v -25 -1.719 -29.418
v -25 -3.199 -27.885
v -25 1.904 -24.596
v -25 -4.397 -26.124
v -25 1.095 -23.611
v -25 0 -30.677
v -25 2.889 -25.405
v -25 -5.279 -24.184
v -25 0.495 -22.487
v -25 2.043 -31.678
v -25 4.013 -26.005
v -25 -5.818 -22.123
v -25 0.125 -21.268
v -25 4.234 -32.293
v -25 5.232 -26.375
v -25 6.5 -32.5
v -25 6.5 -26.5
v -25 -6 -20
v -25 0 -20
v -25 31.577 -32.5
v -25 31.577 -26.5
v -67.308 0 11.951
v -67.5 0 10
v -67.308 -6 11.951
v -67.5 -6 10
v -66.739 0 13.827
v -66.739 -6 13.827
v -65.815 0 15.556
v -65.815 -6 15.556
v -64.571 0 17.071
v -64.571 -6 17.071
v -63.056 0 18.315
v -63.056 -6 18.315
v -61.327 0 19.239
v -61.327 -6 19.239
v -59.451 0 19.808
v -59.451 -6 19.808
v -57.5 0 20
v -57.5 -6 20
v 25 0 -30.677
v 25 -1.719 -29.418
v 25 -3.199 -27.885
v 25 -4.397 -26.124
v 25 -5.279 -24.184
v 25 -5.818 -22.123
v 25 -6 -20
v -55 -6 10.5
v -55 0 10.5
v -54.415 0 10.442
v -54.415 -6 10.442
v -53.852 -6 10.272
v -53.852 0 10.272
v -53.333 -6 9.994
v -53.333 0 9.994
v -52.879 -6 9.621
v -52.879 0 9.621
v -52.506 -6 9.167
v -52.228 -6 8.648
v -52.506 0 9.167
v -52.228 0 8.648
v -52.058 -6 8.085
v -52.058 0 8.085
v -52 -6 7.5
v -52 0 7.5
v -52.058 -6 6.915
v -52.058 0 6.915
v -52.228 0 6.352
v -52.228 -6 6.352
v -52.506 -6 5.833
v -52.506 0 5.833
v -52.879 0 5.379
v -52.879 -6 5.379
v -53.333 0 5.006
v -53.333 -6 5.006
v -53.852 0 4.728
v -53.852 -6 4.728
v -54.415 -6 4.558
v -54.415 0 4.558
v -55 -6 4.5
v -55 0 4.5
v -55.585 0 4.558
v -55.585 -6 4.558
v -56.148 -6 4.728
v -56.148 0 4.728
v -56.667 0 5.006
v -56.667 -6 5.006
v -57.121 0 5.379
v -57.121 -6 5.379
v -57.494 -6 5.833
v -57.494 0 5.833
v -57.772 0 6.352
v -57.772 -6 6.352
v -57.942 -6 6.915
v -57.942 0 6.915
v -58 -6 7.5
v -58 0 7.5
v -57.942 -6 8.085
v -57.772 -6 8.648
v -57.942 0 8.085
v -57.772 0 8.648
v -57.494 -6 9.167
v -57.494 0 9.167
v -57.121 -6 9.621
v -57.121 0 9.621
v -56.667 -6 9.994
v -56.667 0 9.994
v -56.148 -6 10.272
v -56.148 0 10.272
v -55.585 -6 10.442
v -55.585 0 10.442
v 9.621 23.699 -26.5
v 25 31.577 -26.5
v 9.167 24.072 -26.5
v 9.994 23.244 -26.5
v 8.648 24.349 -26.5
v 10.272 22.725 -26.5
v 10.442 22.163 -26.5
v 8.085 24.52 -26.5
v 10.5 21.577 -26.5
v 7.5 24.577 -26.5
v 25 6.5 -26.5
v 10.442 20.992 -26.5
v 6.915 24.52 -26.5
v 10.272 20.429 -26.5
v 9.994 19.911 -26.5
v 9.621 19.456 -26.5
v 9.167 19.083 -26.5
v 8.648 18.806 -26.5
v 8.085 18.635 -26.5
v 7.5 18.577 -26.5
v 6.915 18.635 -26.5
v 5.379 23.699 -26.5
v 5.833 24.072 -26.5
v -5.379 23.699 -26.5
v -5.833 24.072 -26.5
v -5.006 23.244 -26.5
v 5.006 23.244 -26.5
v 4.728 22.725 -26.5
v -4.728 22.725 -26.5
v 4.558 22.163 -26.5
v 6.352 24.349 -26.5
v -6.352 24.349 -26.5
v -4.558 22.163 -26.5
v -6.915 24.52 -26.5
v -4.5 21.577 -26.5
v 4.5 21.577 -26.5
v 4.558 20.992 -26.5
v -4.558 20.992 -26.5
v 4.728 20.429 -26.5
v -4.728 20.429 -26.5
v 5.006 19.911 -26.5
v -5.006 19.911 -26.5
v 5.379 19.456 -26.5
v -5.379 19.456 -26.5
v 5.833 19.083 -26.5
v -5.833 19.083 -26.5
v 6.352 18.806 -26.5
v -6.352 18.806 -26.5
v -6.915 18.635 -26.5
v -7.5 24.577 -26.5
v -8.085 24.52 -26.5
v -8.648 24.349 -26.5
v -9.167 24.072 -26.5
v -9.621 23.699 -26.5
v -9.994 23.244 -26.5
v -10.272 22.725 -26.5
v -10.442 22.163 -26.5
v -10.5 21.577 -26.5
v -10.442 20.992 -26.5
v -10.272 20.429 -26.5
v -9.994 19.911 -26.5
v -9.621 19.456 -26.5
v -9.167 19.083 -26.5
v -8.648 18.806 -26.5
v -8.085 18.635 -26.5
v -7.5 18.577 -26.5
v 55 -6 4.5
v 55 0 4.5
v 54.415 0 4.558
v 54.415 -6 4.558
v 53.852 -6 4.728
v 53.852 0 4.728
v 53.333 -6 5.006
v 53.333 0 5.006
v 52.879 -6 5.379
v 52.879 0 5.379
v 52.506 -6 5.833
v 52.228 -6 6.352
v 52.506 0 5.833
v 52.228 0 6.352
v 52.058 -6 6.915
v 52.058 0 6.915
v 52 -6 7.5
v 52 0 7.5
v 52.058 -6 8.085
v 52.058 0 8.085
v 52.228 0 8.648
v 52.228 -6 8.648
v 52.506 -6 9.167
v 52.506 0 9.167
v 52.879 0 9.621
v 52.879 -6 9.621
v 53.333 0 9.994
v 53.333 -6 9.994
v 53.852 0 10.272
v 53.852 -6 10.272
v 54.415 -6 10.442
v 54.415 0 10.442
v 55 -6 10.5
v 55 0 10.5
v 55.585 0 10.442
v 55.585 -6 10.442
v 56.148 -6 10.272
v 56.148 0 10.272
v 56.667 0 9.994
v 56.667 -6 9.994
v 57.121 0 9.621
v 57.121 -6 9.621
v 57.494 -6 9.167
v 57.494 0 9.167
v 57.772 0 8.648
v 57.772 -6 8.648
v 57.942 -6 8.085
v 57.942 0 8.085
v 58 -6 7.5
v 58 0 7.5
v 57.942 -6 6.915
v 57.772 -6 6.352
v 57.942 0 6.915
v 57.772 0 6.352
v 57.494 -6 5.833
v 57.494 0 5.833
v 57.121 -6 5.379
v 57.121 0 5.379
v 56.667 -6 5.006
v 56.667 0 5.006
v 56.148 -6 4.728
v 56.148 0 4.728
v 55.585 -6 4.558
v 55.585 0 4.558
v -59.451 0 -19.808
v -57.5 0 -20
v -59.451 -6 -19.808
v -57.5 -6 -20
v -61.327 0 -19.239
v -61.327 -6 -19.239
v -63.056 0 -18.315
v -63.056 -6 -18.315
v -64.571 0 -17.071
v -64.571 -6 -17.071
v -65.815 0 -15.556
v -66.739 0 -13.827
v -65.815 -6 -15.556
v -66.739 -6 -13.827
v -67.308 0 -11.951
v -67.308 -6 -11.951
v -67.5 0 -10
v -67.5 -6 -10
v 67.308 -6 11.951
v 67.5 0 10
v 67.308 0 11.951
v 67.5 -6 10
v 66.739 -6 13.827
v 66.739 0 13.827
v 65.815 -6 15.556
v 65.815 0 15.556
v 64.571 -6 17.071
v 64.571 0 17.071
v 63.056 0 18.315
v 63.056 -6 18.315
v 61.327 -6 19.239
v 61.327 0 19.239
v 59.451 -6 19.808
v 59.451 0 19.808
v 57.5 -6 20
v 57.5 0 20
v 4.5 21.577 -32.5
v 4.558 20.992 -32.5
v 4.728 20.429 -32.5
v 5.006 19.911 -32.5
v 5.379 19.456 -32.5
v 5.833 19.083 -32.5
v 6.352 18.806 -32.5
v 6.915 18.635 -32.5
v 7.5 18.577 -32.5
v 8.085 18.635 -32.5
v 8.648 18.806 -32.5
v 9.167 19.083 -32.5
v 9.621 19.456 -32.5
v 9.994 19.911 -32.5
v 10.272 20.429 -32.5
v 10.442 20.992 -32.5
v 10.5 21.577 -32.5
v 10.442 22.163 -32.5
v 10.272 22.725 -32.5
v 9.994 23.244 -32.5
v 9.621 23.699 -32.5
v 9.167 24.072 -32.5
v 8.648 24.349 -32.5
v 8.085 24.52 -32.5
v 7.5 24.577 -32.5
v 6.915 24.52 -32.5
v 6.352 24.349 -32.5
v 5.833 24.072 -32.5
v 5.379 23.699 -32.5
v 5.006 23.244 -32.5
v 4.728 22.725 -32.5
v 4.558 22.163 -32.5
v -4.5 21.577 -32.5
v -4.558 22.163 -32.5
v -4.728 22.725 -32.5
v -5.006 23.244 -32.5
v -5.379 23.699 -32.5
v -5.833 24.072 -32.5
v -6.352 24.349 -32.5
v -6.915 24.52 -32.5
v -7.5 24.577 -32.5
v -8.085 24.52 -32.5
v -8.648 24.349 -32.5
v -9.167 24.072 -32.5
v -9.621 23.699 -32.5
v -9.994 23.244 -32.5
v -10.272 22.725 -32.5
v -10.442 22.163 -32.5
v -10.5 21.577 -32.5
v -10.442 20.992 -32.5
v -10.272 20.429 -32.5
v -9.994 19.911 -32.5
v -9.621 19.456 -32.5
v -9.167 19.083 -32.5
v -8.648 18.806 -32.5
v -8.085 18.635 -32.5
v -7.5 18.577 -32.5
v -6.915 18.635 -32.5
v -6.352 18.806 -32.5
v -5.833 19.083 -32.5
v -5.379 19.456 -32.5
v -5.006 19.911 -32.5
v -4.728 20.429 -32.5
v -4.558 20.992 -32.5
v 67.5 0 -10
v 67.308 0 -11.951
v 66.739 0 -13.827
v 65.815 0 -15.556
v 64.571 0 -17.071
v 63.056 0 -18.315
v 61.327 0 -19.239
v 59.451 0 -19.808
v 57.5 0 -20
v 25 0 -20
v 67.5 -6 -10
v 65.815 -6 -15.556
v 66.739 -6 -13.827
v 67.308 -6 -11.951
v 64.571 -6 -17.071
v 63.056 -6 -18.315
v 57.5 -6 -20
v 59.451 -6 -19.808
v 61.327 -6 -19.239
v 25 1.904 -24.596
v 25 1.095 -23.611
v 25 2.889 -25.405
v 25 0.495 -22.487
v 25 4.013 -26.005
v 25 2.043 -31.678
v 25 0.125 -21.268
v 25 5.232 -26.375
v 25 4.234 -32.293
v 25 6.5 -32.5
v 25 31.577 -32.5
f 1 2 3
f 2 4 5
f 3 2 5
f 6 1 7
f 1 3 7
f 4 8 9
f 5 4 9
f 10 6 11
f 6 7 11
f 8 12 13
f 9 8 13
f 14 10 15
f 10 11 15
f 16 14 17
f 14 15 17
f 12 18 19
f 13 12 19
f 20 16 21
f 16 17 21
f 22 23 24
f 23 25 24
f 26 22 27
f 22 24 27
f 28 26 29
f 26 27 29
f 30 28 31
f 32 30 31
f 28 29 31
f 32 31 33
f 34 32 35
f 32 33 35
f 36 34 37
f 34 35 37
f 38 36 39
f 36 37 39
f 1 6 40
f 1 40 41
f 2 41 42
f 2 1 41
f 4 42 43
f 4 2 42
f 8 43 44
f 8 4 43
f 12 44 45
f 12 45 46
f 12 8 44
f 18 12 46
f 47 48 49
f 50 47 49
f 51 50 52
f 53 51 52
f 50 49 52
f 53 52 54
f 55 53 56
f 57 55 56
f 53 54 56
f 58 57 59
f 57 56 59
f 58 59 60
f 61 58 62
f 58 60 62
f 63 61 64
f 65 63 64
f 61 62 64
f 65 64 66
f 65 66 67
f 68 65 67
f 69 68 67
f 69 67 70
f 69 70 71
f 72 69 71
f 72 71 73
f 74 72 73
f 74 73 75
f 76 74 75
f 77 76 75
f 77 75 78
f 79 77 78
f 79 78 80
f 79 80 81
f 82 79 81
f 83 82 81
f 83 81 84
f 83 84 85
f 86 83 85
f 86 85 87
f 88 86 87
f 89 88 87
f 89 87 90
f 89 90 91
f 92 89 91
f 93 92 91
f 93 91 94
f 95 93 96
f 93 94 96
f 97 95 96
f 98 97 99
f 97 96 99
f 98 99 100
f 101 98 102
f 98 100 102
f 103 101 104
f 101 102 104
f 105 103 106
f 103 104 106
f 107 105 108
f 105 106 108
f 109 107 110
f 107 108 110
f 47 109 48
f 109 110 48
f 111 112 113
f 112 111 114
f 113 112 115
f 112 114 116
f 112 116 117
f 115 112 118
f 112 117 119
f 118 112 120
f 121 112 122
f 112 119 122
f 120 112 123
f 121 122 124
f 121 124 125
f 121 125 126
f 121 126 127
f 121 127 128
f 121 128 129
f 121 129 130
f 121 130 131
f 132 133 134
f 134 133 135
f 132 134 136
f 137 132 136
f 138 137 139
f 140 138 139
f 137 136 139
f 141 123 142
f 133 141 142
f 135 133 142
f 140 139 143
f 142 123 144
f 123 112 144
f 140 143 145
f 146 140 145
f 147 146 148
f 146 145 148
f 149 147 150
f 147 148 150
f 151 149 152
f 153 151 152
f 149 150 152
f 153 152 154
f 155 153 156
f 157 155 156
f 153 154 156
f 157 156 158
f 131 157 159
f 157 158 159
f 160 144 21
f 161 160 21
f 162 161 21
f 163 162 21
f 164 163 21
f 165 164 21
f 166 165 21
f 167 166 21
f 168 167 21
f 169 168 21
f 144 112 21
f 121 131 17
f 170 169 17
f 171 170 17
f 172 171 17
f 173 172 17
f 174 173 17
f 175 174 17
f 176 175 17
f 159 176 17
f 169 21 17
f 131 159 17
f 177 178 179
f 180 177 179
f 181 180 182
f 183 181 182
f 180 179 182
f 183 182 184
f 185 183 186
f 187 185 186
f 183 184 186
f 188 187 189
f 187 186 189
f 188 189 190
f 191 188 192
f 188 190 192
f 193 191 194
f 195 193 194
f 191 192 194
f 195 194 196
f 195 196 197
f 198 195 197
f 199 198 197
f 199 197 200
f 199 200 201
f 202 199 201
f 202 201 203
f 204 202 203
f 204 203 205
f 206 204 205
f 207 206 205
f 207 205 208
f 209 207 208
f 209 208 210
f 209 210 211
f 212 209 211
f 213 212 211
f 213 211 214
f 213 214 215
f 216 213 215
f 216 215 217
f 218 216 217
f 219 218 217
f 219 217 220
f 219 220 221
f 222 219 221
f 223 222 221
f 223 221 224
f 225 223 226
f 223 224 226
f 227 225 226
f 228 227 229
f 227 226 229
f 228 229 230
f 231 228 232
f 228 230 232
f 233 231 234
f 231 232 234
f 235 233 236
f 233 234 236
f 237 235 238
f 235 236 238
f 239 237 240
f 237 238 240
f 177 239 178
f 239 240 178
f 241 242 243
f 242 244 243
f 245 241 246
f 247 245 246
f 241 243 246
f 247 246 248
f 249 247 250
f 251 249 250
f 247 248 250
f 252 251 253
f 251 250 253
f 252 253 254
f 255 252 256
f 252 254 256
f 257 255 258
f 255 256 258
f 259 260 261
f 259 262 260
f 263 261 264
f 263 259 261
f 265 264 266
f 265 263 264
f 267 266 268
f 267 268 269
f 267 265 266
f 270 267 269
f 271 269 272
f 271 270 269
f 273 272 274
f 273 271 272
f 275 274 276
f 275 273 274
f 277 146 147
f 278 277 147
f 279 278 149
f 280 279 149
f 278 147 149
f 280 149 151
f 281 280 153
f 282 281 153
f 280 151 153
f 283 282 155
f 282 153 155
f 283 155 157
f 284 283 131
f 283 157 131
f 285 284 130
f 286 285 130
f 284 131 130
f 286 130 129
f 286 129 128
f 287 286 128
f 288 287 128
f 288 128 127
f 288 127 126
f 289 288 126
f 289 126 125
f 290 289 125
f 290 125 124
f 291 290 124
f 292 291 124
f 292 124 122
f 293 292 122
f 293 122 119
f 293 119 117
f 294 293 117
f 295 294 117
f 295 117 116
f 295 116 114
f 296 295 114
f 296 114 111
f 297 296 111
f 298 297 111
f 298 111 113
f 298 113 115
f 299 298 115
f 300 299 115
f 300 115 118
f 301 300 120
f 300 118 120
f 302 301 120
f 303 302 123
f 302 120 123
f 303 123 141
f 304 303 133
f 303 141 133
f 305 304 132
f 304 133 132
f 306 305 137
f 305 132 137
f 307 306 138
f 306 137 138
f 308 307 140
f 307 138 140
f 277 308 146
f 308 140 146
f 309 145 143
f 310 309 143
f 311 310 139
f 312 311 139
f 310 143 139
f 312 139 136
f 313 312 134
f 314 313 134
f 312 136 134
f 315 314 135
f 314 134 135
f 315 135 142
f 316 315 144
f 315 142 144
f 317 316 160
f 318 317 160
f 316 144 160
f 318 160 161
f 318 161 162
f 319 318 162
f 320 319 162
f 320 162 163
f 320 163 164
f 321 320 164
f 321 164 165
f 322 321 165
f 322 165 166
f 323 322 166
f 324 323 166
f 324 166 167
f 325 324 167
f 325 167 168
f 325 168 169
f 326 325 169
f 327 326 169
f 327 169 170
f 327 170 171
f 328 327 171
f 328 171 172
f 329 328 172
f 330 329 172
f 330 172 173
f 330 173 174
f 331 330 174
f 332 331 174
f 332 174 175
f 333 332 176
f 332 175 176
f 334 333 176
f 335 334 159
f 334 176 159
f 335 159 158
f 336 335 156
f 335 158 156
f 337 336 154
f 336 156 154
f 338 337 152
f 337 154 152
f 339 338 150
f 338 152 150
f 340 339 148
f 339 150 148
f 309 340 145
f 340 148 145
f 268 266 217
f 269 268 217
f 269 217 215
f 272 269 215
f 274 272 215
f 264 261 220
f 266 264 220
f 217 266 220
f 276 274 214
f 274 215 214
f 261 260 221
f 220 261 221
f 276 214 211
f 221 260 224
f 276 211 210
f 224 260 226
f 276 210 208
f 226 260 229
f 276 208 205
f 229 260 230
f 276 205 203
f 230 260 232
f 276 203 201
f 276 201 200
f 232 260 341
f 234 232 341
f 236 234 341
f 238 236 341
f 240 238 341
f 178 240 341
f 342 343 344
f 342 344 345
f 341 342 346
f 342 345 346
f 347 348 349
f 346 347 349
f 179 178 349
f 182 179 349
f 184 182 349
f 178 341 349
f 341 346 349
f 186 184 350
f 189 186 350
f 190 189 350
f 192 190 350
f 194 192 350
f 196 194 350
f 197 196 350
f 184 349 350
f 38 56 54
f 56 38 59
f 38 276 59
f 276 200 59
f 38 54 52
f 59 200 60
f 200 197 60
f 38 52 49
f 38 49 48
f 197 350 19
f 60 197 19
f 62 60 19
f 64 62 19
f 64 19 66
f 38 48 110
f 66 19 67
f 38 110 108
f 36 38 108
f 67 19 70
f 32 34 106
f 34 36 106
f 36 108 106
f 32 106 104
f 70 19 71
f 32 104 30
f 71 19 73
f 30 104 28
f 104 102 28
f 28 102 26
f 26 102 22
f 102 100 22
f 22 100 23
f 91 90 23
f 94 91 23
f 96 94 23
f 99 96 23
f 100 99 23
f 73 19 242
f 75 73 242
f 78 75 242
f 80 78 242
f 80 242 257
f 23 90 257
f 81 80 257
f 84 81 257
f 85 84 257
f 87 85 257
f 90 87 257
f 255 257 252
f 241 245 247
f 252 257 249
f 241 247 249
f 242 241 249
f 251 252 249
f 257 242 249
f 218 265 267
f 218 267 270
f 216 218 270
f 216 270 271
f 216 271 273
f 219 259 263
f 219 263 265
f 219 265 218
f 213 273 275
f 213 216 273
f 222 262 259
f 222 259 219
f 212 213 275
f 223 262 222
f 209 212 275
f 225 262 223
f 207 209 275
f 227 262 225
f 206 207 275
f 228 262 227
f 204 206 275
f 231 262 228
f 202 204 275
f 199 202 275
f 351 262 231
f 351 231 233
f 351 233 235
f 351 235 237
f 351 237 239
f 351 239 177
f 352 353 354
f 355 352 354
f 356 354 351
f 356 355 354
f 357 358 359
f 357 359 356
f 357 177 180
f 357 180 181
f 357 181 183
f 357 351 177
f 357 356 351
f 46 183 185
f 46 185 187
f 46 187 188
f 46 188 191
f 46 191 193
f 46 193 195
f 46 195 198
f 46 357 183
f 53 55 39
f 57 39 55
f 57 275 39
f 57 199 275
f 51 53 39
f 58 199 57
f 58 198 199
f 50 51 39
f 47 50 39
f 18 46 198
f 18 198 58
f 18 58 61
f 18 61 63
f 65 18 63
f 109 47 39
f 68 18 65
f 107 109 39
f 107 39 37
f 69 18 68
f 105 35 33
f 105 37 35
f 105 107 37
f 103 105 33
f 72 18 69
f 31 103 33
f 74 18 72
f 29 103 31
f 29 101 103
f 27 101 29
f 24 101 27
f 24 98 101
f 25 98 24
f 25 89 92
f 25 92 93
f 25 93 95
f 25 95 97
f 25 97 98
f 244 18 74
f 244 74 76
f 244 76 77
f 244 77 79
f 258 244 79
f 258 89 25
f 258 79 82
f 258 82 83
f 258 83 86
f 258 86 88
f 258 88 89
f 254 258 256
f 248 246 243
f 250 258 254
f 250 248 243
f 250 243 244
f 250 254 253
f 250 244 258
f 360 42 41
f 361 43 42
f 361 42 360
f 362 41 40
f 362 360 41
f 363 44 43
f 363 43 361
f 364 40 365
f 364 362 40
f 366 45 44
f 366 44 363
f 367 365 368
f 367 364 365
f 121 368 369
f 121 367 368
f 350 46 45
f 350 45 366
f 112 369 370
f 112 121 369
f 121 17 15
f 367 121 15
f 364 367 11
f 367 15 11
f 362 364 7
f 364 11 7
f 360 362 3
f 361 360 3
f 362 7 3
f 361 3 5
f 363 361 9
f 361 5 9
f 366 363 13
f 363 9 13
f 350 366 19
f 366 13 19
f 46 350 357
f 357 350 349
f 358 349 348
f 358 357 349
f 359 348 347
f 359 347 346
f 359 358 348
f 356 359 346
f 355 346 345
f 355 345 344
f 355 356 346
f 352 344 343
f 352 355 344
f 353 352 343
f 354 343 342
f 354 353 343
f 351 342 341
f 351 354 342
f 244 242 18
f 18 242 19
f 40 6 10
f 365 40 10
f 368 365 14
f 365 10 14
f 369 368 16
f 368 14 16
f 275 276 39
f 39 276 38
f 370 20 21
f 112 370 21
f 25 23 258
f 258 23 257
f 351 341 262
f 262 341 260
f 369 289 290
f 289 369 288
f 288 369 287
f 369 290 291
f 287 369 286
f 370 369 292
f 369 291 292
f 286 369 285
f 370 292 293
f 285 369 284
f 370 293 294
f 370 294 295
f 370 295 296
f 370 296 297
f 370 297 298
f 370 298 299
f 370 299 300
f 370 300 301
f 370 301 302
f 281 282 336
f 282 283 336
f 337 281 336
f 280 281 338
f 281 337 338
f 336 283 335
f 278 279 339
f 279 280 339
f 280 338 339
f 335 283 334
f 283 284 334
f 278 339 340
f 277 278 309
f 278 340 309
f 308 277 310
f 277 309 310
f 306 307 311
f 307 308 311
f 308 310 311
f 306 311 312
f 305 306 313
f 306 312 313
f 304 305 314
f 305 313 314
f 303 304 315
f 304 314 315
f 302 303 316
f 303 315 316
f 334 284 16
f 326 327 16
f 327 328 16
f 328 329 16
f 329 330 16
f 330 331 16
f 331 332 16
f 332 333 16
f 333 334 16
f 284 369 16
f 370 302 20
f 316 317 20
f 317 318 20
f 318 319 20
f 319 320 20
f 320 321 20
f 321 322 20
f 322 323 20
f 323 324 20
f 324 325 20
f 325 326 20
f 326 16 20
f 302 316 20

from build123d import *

# Parameters (mm, degrees)
BASE_FLANGE1_DEPTH     = 6
SKETCHED_START         = -25
SKETCHED_BEND1_DEPTH   = 50
SKETCHED_BEND1_2_DEPTH = 50
SKETCH8_R              = 3
CUT_EXTRUDE1_DEPTH     = 82.299658022
SKETCH9_R              = 3
CUT_EXTRUDE2_DEPTH     = 88.83868393
FILLET1_R              = 10


# Read off the part's stored shape, not the designer's step: Sketched Bend1
# Sheet-metal steps are written as plain solids
with BuildPart() as part:
    # Sketch1 → Base-Flange1 (new body)
    with BuildSketch(Plane(origin=(0, 0, 0), x_dir=(1, 0, 0), z_dir=(0, 1, 0))):
        Polygon((25, 20), (67.5, 20), (67.5, -20), (-67.5, -20), (-67.5, 20), (-25, 20), (-25, 60), (25, 60), align=None)
    extrude(amount=-BASE_FLANGE1_DEPTH)

    # Sketched Bend1 outline → Sketched Bend1 (cut)
    with BuildSketch(Plane.YZ.offset(SKETCHED_START)):
        with BuildLine():
            Line((0, -60), (0, -30.677078252))
            ThreePointArc((0, -30.677078252), (-4.397247359, -26.123724357), (-6, -20))
            Line((-6, -20), (-6, -60))
            Line((-6, -60), (0, -60))
        make_face()
    extrude(amount=SKETCHED_BEND1_DEPTH, mode=Mode.SUBTRACT)

    # Sketched Bend1 2 outline → Sketched Bend1 2 (add)
    with BuildSketch(Plane.YZ.offset(SKETCHED_START)):
        with BuildLine():
            Line((6.5, -32.5), (31.577434895, -32.5))
            Line((31.577434895, -32.5), (31.577434895, -26.5))
            Line((31.577434895, -26.5), (6.5, -26.5))
            ThreePointArc((6.5, -26.5), (1.903805922, -24.596194078), (0, -20))
            Line((0, -20), (0, -30.677078252))
            ThreePointArc((0, -30.677078252), (3.124609515, -32.035644523), (6.5, -32.5))
        make_face()
    extrude(amount=SKETCHED_BEND1_2_DEPTH)

    # Sketch8 → Cut-Extrude1 (cut, through all)
    with BuildSketch(Plane(origin=(0, 0, 0), x_dir=(1, 0, 0), z_dir=(0, 1, 0))):
        with Locations(Location((-55, -7.5, 0), (0, 0, 270))):
            Circle(SKETCH8_R)
        with Locations(Location((55, -7.5, 0), (0, 0, 90))):
            Circle(SKETCH8_R)
    extrude(amount=-CUT_EXTRUDE1_DEPTH, mode=Mode.SUBTRACT)

    # Sketch9 → Cut-Extrude2 (cut, through all)
    with BuildSketch(Plane.XY.offset(-26.5)):
        with Locations((-7.5, 21.577434895)):
            Circle(SKETCH9_R)
        with Locations(Location((7.5, 21.577434895, 0), (0, 0, 180))):
            Circle(SKETCH9_R)
    extrude(amount=-CUT_EXTRUDE2_DEPTH, mode=Mode.SUBTRACT)

    # Fillet1
    fillet1_edges = [part.edges().sort_by_distance(p)[0] for p in [
        (-67.5, -3, 20),
        (67.5, -3, 20),
        (67.5, -3, -20),
        (-67.5, -3, -20),
    ]]
    fillet(fillet1_edges, radius=FILLET1_R)


solid = part.part
